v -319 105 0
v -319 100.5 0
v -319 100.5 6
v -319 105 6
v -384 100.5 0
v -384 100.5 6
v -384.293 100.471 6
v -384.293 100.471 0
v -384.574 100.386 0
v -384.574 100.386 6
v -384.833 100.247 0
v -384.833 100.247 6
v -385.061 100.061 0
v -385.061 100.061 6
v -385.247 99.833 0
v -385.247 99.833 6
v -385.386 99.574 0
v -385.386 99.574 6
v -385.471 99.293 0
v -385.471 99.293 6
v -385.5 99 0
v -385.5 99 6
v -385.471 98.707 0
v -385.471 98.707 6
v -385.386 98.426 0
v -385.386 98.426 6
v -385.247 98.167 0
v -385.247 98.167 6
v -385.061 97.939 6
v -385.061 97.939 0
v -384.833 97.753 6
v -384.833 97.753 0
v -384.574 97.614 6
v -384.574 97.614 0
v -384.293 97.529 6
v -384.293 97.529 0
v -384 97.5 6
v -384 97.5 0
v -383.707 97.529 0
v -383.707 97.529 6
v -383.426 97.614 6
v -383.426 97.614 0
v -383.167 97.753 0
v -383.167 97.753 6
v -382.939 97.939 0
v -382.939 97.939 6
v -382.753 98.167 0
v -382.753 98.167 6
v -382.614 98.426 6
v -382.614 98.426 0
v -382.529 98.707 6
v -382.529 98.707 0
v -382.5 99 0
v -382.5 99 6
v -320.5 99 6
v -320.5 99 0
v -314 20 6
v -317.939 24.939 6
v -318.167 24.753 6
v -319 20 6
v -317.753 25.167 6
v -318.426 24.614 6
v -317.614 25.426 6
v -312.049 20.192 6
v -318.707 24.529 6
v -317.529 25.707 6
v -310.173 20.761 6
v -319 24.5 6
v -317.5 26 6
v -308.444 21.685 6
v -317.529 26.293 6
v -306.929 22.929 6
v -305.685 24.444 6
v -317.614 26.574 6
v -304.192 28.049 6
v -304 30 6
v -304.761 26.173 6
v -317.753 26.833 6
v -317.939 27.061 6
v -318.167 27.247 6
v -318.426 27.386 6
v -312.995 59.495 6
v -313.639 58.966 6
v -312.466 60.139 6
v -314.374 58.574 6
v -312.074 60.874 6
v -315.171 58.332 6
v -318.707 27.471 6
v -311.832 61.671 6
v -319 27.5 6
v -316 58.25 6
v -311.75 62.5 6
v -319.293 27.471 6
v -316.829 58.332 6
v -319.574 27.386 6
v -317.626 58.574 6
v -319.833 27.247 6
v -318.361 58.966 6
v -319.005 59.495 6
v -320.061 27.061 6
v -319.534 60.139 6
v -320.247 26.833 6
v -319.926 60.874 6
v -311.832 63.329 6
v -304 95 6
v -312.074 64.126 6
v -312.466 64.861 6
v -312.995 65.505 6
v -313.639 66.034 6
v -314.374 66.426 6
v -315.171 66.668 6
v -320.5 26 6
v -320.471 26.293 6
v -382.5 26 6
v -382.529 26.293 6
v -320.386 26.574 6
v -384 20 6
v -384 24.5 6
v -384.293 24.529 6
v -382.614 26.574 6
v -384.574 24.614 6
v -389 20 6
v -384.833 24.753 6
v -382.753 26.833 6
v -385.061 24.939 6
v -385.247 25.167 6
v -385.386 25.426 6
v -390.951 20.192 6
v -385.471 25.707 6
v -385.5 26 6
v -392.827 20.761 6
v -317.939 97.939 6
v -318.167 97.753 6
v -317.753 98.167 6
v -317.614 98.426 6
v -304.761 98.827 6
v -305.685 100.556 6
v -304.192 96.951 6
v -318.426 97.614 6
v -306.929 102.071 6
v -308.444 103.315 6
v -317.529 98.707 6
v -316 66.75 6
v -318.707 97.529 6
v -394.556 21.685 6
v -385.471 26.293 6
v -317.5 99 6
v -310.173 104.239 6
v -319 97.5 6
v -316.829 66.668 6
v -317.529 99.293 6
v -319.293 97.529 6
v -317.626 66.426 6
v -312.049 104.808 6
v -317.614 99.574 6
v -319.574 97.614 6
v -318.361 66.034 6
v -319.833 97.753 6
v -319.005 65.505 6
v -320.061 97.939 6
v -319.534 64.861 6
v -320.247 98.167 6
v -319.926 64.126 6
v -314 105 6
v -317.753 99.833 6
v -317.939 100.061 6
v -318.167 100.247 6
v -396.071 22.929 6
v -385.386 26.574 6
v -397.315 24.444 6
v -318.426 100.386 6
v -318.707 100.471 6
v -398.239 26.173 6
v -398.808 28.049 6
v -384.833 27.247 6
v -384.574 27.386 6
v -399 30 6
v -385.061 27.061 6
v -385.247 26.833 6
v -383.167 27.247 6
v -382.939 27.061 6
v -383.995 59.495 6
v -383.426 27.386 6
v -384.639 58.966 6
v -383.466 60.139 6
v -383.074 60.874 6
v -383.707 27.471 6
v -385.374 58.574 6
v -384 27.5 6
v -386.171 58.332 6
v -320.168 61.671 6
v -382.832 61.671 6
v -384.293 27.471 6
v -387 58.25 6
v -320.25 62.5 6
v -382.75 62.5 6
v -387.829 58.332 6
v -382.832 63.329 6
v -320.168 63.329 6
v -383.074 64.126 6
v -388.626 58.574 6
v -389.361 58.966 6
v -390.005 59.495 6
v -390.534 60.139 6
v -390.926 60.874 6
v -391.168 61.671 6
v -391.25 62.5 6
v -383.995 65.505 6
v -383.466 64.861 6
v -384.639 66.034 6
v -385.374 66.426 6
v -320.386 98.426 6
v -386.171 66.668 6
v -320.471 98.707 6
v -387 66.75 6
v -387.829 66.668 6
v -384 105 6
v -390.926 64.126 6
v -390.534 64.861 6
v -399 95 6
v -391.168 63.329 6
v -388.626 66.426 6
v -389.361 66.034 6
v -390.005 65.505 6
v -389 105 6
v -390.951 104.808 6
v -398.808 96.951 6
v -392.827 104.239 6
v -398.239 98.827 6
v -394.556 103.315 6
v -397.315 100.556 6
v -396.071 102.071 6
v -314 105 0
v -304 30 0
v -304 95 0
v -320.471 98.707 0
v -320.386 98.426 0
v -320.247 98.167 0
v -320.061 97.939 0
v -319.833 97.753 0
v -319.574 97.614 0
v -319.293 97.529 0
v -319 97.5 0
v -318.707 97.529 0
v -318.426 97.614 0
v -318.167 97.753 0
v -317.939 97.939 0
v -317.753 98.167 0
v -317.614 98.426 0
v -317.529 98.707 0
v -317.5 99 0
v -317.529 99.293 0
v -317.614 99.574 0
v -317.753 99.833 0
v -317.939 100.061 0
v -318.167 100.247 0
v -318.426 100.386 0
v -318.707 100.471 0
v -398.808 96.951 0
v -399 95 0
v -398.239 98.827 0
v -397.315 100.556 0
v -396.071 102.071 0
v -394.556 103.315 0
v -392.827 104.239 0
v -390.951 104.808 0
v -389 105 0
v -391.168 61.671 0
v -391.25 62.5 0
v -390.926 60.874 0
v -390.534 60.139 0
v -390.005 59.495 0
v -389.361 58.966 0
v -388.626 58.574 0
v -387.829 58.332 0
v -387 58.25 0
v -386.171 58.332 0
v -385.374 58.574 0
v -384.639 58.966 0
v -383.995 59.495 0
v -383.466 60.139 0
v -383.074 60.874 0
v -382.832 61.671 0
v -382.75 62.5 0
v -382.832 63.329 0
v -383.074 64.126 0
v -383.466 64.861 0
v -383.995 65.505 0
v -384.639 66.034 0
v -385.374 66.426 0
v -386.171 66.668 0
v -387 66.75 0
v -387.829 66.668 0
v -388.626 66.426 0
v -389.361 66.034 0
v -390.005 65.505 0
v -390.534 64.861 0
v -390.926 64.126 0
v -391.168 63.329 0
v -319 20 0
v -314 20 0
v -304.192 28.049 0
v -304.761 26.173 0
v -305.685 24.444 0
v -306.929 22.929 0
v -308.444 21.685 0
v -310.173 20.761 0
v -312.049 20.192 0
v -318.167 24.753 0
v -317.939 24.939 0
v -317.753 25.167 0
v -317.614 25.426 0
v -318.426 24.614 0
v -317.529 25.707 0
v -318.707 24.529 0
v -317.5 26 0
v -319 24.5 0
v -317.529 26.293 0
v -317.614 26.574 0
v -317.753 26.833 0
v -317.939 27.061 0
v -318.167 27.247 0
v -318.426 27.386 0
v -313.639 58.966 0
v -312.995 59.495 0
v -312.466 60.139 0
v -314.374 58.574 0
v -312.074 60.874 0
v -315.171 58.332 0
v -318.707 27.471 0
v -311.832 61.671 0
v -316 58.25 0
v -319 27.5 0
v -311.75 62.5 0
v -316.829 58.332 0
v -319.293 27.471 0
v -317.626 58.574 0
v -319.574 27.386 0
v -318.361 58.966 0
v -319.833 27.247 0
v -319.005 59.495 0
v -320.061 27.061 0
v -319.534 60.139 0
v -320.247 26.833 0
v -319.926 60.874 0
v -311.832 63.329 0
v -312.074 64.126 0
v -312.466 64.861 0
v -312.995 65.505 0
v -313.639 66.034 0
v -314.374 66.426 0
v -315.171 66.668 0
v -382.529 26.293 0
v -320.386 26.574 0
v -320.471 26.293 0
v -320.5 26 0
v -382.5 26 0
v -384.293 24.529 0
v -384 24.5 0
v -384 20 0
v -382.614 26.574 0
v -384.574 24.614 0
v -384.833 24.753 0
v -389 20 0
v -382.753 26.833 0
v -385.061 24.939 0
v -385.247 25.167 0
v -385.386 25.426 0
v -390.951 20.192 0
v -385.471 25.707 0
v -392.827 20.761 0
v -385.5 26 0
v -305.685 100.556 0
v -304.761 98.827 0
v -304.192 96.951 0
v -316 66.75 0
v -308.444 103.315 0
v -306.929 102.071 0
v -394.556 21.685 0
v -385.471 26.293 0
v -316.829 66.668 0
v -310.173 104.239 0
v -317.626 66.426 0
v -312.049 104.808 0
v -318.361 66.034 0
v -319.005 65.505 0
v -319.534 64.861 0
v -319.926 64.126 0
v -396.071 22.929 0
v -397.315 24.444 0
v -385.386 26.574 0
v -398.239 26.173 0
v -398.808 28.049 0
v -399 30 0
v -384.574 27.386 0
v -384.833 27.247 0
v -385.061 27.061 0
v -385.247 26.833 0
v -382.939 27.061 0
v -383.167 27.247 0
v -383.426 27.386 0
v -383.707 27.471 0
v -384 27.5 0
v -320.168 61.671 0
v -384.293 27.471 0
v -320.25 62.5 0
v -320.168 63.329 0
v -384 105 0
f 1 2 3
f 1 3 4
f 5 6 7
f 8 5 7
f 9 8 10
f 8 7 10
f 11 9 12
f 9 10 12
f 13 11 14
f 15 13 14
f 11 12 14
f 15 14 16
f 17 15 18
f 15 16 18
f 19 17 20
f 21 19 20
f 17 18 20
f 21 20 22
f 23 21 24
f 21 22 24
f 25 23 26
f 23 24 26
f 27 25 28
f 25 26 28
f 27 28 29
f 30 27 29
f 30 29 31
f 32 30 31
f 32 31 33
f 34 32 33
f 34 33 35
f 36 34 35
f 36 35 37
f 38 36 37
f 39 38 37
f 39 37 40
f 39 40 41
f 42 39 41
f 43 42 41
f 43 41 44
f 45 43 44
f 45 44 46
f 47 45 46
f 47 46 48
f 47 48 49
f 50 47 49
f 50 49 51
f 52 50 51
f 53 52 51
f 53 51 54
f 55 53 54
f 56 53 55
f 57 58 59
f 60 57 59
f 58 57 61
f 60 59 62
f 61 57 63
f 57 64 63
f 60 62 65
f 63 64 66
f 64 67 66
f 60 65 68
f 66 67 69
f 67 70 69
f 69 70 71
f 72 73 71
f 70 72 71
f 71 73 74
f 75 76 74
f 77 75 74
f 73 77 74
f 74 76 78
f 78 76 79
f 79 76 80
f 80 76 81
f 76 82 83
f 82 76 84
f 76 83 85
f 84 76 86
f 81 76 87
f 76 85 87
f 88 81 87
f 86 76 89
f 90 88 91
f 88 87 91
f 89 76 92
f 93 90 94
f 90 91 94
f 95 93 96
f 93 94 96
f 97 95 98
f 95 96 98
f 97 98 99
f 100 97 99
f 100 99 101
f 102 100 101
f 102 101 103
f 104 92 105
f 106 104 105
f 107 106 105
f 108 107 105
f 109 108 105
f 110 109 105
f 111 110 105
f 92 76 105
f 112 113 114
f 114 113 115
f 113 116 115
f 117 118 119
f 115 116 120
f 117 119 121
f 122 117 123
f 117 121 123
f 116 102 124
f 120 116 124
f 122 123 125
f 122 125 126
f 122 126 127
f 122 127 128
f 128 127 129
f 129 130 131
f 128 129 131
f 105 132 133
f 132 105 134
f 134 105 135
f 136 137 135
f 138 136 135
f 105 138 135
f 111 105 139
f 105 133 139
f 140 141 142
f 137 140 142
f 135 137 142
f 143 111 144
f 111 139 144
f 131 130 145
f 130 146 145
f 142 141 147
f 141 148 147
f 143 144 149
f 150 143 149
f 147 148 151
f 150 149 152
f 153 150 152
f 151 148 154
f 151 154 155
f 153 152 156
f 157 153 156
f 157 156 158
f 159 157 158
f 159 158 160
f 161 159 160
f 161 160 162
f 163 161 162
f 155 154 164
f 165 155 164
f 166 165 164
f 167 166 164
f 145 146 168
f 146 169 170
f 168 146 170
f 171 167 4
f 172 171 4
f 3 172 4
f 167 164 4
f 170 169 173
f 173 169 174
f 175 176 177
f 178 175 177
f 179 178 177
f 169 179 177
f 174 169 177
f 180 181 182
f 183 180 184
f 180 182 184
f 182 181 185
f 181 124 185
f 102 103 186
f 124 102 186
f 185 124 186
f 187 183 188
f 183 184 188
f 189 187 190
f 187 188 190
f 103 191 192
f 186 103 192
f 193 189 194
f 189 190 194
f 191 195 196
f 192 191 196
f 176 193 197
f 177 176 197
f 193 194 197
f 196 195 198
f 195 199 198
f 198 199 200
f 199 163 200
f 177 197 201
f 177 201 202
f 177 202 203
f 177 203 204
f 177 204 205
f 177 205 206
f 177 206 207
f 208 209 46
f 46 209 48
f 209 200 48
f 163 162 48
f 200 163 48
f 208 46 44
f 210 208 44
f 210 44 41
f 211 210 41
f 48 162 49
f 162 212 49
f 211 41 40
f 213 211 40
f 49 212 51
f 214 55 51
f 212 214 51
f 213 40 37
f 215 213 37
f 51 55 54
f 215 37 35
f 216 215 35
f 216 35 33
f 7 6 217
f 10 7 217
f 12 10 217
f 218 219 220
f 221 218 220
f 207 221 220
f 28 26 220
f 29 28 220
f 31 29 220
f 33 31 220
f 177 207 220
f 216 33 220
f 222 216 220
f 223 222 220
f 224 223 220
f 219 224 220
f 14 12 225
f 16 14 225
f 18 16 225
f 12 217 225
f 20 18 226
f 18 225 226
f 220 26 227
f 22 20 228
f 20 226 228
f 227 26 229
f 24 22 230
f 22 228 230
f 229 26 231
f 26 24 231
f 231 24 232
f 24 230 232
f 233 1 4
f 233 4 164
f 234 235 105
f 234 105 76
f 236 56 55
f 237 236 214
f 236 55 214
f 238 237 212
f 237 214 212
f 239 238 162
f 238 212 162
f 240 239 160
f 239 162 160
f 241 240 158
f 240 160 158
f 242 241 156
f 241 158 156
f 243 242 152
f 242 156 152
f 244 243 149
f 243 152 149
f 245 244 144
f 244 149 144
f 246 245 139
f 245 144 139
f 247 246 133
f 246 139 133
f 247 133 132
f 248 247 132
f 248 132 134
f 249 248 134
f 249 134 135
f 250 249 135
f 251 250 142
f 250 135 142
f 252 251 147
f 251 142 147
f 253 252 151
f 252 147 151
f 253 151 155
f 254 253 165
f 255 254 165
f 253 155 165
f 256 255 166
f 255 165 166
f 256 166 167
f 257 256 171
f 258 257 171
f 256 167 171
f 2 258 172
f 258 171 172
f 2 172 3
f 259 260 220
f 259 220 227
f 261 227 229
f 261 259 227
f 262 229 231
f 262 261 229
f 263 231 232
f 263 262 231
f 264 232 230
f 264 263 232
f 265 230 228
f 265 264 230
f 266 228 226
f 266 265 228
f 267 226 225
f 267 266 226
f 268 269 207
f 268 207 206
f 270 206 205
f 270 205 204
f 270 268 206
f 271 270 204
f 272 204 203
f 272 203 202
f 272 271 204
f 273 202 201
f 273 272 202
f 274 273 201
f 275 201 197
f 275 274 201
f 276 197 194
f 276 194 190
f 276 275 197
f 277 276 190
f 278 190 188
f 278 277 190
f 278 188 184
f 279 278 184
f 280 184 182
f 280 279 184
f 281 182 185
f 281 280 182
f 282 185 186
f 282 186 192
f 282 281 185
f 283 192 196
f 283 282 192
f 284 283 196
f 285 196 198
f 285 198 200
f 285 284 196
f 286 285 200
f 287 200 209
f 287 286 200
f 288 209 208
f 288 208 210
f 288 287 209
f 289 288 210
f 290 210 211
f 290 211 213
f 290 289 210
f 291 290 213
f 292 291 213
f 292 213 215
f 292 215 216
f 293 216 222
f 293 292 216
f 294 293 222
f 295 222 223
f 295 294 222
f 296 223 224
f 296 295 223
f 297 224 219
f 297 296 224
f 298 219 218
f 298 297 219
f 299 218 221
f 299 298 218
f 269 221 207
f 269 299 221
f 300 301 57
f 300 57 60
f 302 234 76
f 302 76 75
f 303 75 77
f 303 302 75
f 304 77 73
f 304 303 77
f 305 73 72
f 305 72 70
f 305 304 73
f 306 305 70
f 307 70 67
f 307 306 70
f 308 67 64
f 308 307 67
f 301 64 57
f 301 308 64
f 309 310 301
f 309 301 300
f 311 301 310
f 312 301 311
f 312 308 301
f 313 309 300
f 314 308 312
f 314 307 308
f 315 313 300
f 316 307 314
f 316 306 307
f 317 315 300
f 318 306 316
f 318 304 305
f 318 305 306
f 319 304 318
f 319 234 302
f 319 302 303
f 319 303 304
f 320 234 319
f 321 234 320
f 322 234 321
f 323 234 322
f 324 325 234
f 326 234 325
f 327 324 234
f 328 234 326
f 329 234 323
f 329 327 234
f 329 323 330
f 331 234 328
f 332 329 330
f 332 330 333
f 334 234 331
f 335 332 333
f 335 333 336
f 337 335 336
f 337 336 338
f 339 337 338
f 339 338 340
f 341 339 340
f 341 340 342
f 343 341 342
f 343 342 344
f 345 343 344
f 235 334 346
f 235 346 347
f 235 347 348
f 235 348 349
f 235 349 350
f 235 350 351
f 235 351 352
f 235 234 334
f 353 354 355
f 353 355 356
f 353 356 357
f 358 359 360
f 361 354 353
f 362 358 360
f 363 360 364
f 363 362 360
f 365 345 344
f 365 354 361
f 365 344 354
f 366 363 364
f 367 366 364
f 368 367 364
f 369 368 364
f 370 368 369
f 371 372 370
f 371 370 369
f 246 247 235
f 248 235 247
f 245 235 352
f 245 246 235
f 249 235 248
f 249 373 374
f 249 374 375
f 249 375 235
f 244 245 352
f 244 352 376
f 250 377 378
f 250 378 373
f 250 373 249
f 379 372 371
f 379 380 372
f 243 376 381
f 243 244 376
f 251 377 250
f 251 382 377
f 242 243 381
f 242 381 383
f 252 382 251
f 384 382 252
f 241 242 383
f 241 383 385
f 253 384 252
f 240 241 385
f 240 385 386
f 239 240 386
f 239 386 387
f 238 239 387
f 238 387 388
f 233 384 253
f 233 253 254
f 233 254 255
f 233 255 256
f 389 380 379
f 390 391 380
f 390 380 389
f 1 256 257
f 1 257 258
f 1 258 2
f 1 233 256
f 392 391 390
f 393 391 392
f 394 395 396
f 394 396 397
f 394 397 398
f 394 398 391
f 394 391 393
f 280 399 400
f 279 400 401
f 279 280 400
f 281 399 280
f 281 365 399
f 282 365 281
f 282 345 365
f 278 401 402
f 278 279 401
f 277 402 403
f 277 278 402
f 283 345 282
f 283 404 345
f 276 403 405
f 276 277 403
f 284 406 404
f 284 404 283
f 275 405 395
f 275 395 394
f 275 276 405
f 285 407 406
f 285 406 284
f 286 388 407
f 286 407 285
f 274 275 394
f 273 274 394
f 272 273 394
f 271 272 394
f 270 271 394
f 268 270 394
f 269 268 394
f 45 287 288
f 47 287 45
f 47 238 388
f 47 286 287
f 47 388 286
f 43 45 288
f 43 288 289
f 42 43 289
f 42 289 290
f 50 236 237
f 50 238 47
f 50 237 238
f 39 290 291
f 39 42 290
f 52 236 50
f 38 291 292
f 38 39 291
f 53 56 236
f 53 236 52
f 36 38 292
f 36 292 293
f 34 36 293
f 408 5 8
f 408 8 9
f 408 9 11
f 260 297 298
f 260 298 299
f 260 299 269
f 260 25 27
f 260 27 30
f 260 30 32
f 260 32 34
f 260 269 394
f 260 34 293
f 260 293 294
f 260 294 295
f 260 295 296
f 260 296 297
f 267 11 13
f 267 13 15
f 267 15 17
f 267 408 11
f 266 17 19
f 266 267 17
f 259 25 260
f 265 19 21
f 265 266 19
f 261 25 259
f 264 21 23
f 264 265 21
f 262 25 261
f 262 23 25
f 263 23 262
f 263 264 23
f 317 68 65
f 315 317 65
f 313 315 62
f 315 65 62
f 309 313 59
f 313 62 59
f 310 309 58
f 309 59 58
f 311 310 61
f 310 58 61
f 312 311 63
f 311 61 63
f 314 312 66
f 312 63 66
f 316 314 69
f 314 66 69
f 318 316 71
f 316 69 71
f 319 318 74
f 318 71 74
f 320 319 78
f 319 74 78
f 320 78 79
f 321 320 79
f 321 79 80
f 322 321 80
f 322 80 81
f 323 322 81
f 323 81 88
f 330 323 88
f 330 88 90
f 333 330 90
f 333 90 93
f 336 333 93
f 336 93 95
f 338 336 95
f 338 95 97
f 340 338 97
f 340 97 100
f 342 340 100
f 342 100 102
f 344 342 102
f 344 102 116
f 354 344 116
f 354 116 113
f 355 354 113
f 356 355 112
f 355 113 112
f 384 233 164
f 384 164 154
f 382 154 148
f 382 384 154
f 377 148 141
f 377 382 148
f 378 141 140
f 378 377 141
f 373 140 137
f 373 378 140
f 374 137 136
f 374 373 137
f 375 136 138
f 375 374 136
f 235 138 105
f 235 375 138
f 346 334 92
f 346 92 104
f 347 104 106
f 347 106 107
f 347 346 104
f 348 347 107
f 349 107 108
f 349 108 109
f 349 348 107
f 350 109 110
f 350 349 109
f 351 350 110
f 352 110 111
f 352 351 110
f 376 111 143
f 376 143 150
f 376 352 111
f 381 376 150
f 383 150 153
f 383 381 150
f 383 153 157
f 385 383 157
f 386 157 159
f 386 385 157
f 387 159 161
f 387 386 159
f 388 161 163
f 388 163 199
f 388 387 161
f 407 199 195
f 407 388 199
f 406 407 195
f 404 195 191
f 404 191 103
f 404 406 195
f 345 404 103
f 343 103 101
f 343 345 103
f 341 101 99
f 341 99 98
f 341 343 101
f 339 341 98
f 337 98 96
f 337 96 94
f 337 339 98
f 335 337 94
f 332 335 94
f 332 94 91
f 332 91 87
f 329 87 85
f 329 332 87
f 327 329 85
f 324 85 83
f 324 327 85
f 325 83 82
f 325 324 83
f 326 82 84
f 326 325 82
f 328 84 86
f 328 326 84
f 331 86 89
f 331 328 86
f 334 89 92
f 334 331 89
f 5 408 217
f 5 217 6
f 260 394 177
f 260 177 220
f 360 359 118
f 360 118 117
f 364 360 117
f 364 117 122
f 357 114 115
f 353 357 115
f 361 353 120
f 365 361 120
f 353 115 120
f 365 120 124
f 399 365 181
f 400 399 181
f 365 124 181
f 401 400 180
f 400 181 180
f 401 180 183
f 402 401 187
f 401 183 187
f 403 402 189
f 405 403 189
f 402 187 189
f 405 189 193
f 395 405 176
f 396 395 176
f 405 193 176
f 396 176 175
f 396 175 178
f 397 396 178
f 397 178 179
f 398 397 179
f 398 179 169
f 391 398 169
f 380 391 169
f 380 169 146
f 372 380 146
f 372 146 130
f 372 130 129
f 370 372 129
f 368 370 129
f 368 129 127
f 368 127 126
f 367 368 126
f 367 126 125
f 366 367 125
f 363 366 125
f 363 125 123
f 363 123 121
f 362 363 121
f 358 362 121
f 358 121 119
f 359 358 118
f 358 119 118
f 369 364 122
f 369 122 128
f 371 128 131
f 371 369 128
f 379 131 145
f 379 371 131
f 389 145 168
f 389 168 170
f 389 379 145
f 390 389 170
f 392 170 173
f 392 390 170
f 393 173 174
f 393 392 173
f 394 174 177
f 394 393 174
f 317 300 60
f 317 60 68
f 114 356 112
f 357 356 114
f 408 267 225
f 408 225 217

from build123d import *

# Parameters (mm, degrees)
SKETCH1_R           = 4.25
BOSS_EXTRUDE1_DEPTH = 6
SKETCH2_R           = 1.5
CUT_EXTRUDE1_DEPTH  = 413.628161909


with BuildPart() as part:
    # Sketch1 → Boss-Extrude1 (new body)
    with BuildSketch(Plane.XY):
        with BuildLine():
            Line((-384, 99), (-319, 99))
            Line((-319, 99), (-319, 105))
            Line((-319, 105), (-314, 105))
            ThreePointArc((-314, 105), (-306.928932188, 102.071067812), (-304, 95))
            Line((-304, 95), (-304, 30))
            ThreePointArc((-304, 30), (-306.928932188, 22.928932188), (-314, 20))
            Line((-314, 20), (-319, 20))
            Line((-319, 20), (-319, 26))
            Line((-319, 26), (-384, 26))
            Line((-384, 26), (-384, 20))
            Line((-384, 20), (-389, 20))
            ThreePointArc((-389, 20), (-396.071067812, 22.928932188), (-399, 30))
            Line((-399, 30), (-399, 95))
            ThreePointArc((-399, 95), (-396.071067812, 102.071067812), (-389, 105))
            Line((-389, 105), (-384, 105))
            Line((-384, 105), (-384, 99))
        make_face()
        with Locations((-316, 62.5)):
            Circle(SKETCH1_R, mode=Mode.SUBTRACT)
        with Locations(Location((-387, 62.5, 0), (0, 0, 180))):
            Circle(SKETCH1_R, mode=Mode.SUBTRACT)
    extrude(amount=BOSS_EXTRUDE1_DEPTH)

    # Sketch2 → Cut-Extrude1 (cut, through all)
    with BuildSketch(Plane.XY.offset(6)):
        with Locations((-384, 26)):
            Circle(SKETCH2_R)
        with Locations((-319, 26)):
            Circle(SKETCH2_R)
        with Locations((-384, 99)):
            Circle(SKETCH2_R)
        with Locations((-319, 99)):
            Circle(SKETCH2_R)
    extrude(amount=-CUT_EXTRUDE1_DEPTH, mode=Mode.SUBTRACT)


solid = part.part
